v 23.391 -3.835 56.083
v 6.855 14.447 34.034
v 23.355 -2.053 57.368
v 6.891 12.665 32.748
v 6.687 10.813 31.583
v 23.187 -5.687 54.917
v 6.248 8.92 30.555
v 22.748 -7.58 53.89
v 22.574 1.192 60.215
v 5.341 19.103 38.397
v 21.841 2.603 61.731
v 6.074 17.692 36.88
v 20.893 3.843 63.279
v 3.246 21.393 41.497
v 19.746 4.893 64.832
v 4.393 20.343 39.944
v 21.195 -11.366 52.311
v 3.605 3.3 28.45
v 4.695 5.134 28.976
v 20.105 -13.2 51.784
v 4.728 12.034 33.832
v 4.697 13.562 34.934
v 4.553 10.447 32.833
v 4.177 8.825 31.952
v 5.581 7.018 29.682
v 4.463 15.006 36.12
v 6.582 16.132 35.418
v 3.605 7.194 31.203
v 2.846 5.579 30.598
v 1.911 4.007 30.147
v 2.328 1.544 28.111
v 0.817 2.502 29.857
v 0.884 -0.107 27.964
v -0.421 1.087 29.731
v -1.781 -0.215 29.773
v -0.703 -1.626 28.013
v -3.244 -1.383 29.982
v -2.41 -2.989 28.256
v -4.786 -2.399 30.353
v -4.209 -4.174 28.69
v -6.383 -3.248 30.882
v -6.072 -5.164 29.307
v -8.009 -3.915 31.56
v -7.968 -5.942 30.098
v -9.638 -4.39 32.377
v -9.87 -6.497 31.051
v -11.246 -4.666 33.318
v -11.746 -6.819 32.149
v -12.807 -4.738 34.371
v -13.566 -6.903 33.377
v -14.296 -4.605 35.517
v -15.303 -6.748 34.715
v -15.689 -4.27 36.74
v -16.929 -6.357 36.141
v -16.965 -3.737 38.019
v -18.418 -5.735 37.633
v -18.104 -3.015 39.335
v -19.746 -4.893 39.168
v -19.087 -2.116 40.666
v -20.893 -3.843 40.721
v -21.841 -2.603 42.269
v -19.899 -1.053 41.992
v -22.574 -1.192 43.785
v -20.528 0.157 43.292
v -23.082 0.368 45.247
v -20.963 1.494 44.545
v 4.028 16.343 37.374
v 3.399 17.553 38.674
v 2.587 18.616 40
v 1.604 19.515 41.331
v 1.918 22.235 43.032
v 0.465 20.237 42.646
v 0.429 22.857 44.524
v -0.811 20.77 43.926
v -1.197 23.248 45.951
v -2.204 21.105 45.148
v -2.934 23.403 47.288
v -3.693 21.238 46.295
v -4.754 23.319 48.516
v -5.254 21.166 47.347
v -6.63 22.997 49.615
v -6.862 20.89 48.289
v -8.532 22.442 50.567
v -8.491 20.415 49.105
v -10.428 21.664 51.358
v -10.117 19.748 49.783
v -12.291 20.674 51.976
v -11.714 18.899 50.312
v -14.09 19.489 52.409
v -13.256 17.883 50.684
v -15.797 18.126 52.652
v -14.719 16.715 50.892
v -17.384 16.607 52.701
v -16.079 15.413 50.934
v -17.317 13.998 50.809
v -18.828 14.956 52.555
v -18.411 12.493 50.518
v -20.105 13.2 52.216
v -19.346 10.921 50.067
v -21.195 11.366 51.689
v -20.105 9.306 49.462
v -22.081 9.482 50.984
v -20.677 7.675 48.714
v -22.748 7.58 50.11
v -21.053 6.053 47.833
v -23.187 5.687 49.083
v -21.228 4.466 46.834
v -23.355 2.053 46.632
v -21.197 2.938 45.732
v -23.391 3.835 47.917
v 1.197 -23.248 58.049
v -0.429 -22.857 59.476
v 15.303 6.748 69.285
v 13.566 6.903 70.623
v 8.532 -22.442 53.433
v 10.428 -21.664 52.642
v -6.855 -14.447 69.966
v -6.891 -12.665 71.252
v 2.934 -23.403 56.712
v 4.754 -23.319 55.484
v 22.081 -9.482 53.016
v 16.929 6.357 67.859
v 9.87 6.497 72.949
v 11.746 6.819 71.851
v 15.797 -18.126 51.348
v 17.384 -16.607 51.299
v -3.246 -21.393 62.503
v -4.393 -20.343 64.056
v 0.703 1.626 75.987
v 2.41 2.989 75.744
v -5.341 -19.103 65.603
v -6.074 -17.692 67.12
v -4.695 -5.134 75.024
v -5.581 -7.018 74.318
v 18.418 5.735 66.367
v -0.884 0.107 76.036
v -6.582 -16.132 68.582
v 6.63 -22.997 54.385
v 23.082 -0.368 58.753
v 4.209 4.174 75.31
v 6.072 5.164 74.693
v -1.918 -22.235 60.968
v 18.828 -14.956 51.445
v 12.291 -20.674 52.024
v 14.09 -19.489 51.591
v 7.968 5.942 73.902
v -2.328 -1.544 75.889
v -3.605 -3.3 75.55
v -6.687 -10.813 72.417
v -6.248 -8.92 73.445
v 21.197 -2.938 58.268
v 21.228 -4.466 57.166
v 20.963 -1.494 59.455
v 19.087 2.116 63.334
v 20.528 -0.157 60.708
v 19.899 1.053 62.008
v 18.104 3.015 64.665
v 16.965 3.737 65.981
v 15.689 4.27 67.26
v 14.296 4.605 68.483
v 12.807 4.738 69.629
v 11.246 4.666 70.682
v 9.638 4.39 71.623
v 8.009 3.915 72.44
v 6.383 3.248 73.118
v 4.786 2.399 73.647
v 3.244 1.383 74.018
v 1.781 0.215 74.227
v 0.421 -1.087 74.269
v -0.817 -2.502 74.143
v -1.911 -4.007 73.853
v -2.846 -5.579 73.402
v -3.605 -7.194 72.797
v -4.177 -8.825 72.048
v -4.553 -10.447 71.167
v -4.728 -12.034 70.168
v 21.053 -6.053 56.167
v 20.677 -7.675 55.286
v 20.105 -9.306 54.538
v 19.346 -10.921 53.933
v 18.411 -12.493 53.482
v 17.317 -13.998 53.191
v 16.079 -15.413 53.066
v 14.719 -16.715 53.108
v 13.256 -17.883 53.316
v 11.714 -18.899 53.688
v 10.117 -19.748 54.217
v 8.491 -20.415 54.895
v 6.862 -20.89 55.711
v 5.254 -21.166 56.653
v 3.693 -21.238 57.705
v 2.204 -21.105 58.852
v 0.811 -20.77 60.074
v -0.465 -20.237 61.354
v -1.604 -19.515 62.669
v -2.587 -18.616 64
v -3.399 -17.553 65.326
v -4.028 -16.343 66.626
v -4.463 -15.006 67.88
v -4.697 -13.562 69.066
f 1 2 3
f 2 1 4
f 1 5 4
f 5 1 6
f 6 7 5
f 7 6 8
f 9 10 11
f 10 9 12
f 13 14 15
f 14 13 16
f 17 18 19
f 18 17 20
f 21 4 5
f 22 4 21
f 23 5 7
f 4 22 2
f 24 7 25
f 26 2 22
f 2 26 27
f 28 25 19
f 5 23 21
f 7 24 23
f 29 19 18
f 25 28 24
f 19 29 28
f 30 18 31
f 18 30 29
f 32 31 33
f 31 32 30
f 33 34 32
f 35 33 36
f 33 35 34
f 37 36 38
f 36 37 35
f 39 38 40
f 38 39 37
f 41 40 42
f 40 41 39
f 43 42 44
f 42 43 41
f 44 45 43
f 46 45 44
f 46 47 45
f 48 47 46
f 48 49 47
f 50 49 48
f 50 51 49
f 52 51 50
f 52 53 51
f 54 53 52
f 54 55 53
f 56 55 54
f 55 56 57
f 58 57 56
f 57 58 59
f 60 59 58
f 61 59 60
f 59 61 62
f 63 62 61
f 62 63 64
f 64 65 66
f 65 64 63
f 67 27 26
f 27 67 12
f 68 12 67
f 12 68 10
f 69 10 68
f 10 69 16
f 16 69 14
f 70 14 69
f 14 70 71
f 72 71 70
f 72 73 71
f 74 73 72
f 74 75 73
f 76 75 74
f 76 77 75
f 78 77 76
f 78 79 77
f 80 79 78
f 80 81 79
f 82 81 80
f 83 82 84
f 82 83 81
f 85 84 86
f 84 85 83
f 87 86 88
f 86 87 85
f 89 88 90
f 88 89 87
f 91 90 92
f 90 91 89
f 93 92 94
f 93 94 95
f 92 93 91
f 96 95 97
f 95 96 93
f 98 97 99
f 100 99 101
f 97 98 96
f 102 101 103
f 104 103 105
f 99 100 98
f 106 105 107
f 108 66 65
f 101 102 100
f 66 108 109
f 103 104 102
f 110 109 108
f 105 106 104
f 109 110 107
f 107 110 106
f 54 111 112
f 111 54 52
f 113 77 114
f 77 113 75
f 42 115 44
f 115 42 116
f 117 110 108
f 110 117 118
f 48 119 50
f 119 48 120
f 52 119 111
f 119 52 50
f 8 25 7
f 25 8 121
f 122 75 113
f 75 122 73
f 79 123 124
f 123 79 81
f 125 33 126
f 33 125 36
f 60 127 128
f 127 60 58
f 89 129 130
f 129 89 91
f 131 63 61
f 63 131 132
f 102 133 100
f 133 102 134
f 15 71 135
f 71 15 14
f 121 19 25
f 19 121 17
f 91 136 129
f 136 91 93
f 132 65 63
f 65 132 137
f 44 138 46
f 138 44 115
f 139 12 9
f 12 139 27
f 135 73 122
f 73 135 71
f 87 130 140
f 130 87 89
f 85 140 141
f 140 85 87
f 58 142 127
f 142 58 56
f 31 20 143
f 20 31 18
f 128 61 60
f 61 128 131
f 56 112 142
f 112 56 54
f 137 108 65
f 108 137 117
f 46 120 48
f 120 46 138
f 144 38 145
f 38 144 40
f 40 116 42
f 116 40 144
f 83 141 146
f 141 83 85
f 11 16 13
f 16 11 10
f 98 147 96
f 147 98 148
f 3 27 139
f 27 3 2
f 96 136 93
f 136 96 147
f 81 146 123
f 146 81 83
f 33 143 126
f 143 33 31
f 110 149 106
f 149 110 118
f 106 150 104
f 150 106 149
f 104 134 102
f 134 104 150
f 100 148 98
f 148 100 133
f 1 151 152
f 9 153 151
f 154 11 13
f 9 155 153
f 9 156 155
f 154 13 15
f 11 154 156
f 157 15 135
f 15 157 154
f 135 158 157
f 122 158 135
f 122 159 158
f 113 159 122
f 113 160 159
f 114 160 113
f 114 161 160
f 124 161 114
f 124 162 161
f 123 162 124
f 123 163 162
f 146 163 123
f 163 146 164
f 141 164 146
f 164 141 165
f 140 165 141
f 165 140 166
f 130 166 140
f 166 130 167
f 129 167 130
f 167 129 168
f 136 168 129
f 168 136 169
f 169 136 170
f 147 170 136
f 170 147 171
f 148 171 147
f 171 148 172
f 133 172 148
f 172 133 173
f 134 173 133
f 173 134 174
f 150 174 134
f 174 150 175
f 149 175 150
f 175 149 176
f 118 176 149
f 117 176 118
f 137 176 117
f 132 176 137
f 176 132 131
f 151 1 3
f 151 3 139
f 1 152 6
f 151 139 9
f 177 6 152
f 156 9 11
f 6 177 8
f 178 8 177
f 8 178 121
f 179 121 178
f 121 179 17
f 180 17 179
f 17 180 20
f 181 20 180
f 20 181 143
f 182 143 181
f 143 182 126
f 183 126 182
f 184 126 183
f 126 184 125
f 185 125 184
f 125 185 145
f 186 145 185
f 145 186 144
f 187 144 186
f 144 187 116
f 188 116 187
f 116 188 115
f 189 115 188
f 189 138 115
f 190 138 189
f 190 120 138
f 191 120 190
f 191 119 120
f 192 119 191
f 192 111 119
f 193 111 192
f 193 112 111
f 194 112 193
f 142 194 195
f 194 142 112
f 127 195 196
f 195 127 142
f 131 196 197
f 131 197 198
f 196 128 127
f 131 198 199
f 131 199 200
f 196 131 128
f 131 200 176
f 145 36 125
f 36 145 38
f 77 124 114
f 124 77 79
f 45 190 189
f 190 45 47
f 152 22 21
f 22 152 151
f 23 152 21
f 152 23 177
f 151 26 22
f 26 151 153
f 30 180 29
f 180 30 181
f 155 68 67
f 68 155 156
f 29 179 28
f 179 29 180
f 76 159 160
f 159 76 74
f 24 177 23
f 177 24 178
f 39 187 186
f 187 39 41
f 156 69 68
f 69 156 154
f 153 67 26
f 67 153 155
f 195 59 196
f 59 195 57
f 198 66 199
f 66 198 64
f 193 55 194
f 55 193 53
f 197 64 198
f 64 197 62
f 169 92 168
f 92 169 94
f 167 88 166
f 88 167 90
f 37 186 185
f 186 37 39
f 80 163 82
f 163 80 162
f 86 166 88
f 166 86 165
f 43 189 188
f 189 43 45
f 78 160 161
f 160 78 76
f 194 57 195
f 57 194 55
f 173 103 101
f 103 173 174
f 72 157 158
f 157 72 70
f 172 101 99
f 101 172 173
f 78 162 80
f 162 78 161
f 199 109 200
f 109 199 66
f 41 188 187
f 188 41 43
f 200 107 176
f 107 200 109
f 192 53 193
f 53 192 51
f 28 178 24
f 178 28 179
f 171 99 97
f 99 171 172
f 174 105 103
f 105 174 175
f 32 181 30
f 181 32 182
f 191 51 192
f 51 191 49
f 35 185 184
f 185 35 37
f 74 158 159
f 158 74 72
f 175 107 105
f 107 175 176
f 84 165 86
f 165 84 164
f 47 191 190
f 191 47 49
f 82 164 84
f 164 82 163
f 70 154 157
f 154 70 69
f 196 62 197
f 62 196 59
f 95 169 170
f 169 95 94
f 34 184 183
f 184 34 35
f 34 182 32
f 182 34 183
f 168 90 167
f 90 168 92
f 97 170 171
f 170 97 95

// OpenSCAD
$fn=50;
module attachment() {
    translate([0,0,52]) {
        rotate(a=45, v=[1,1,0]){
            difference() {
                cylinder(d1=35,h=33,d2=35, center=true);
                cylinder(d1=30,h=33,d2=30, center=true);
            }
        }
    }
}

attachment();

polygon(3,10, center=true);
